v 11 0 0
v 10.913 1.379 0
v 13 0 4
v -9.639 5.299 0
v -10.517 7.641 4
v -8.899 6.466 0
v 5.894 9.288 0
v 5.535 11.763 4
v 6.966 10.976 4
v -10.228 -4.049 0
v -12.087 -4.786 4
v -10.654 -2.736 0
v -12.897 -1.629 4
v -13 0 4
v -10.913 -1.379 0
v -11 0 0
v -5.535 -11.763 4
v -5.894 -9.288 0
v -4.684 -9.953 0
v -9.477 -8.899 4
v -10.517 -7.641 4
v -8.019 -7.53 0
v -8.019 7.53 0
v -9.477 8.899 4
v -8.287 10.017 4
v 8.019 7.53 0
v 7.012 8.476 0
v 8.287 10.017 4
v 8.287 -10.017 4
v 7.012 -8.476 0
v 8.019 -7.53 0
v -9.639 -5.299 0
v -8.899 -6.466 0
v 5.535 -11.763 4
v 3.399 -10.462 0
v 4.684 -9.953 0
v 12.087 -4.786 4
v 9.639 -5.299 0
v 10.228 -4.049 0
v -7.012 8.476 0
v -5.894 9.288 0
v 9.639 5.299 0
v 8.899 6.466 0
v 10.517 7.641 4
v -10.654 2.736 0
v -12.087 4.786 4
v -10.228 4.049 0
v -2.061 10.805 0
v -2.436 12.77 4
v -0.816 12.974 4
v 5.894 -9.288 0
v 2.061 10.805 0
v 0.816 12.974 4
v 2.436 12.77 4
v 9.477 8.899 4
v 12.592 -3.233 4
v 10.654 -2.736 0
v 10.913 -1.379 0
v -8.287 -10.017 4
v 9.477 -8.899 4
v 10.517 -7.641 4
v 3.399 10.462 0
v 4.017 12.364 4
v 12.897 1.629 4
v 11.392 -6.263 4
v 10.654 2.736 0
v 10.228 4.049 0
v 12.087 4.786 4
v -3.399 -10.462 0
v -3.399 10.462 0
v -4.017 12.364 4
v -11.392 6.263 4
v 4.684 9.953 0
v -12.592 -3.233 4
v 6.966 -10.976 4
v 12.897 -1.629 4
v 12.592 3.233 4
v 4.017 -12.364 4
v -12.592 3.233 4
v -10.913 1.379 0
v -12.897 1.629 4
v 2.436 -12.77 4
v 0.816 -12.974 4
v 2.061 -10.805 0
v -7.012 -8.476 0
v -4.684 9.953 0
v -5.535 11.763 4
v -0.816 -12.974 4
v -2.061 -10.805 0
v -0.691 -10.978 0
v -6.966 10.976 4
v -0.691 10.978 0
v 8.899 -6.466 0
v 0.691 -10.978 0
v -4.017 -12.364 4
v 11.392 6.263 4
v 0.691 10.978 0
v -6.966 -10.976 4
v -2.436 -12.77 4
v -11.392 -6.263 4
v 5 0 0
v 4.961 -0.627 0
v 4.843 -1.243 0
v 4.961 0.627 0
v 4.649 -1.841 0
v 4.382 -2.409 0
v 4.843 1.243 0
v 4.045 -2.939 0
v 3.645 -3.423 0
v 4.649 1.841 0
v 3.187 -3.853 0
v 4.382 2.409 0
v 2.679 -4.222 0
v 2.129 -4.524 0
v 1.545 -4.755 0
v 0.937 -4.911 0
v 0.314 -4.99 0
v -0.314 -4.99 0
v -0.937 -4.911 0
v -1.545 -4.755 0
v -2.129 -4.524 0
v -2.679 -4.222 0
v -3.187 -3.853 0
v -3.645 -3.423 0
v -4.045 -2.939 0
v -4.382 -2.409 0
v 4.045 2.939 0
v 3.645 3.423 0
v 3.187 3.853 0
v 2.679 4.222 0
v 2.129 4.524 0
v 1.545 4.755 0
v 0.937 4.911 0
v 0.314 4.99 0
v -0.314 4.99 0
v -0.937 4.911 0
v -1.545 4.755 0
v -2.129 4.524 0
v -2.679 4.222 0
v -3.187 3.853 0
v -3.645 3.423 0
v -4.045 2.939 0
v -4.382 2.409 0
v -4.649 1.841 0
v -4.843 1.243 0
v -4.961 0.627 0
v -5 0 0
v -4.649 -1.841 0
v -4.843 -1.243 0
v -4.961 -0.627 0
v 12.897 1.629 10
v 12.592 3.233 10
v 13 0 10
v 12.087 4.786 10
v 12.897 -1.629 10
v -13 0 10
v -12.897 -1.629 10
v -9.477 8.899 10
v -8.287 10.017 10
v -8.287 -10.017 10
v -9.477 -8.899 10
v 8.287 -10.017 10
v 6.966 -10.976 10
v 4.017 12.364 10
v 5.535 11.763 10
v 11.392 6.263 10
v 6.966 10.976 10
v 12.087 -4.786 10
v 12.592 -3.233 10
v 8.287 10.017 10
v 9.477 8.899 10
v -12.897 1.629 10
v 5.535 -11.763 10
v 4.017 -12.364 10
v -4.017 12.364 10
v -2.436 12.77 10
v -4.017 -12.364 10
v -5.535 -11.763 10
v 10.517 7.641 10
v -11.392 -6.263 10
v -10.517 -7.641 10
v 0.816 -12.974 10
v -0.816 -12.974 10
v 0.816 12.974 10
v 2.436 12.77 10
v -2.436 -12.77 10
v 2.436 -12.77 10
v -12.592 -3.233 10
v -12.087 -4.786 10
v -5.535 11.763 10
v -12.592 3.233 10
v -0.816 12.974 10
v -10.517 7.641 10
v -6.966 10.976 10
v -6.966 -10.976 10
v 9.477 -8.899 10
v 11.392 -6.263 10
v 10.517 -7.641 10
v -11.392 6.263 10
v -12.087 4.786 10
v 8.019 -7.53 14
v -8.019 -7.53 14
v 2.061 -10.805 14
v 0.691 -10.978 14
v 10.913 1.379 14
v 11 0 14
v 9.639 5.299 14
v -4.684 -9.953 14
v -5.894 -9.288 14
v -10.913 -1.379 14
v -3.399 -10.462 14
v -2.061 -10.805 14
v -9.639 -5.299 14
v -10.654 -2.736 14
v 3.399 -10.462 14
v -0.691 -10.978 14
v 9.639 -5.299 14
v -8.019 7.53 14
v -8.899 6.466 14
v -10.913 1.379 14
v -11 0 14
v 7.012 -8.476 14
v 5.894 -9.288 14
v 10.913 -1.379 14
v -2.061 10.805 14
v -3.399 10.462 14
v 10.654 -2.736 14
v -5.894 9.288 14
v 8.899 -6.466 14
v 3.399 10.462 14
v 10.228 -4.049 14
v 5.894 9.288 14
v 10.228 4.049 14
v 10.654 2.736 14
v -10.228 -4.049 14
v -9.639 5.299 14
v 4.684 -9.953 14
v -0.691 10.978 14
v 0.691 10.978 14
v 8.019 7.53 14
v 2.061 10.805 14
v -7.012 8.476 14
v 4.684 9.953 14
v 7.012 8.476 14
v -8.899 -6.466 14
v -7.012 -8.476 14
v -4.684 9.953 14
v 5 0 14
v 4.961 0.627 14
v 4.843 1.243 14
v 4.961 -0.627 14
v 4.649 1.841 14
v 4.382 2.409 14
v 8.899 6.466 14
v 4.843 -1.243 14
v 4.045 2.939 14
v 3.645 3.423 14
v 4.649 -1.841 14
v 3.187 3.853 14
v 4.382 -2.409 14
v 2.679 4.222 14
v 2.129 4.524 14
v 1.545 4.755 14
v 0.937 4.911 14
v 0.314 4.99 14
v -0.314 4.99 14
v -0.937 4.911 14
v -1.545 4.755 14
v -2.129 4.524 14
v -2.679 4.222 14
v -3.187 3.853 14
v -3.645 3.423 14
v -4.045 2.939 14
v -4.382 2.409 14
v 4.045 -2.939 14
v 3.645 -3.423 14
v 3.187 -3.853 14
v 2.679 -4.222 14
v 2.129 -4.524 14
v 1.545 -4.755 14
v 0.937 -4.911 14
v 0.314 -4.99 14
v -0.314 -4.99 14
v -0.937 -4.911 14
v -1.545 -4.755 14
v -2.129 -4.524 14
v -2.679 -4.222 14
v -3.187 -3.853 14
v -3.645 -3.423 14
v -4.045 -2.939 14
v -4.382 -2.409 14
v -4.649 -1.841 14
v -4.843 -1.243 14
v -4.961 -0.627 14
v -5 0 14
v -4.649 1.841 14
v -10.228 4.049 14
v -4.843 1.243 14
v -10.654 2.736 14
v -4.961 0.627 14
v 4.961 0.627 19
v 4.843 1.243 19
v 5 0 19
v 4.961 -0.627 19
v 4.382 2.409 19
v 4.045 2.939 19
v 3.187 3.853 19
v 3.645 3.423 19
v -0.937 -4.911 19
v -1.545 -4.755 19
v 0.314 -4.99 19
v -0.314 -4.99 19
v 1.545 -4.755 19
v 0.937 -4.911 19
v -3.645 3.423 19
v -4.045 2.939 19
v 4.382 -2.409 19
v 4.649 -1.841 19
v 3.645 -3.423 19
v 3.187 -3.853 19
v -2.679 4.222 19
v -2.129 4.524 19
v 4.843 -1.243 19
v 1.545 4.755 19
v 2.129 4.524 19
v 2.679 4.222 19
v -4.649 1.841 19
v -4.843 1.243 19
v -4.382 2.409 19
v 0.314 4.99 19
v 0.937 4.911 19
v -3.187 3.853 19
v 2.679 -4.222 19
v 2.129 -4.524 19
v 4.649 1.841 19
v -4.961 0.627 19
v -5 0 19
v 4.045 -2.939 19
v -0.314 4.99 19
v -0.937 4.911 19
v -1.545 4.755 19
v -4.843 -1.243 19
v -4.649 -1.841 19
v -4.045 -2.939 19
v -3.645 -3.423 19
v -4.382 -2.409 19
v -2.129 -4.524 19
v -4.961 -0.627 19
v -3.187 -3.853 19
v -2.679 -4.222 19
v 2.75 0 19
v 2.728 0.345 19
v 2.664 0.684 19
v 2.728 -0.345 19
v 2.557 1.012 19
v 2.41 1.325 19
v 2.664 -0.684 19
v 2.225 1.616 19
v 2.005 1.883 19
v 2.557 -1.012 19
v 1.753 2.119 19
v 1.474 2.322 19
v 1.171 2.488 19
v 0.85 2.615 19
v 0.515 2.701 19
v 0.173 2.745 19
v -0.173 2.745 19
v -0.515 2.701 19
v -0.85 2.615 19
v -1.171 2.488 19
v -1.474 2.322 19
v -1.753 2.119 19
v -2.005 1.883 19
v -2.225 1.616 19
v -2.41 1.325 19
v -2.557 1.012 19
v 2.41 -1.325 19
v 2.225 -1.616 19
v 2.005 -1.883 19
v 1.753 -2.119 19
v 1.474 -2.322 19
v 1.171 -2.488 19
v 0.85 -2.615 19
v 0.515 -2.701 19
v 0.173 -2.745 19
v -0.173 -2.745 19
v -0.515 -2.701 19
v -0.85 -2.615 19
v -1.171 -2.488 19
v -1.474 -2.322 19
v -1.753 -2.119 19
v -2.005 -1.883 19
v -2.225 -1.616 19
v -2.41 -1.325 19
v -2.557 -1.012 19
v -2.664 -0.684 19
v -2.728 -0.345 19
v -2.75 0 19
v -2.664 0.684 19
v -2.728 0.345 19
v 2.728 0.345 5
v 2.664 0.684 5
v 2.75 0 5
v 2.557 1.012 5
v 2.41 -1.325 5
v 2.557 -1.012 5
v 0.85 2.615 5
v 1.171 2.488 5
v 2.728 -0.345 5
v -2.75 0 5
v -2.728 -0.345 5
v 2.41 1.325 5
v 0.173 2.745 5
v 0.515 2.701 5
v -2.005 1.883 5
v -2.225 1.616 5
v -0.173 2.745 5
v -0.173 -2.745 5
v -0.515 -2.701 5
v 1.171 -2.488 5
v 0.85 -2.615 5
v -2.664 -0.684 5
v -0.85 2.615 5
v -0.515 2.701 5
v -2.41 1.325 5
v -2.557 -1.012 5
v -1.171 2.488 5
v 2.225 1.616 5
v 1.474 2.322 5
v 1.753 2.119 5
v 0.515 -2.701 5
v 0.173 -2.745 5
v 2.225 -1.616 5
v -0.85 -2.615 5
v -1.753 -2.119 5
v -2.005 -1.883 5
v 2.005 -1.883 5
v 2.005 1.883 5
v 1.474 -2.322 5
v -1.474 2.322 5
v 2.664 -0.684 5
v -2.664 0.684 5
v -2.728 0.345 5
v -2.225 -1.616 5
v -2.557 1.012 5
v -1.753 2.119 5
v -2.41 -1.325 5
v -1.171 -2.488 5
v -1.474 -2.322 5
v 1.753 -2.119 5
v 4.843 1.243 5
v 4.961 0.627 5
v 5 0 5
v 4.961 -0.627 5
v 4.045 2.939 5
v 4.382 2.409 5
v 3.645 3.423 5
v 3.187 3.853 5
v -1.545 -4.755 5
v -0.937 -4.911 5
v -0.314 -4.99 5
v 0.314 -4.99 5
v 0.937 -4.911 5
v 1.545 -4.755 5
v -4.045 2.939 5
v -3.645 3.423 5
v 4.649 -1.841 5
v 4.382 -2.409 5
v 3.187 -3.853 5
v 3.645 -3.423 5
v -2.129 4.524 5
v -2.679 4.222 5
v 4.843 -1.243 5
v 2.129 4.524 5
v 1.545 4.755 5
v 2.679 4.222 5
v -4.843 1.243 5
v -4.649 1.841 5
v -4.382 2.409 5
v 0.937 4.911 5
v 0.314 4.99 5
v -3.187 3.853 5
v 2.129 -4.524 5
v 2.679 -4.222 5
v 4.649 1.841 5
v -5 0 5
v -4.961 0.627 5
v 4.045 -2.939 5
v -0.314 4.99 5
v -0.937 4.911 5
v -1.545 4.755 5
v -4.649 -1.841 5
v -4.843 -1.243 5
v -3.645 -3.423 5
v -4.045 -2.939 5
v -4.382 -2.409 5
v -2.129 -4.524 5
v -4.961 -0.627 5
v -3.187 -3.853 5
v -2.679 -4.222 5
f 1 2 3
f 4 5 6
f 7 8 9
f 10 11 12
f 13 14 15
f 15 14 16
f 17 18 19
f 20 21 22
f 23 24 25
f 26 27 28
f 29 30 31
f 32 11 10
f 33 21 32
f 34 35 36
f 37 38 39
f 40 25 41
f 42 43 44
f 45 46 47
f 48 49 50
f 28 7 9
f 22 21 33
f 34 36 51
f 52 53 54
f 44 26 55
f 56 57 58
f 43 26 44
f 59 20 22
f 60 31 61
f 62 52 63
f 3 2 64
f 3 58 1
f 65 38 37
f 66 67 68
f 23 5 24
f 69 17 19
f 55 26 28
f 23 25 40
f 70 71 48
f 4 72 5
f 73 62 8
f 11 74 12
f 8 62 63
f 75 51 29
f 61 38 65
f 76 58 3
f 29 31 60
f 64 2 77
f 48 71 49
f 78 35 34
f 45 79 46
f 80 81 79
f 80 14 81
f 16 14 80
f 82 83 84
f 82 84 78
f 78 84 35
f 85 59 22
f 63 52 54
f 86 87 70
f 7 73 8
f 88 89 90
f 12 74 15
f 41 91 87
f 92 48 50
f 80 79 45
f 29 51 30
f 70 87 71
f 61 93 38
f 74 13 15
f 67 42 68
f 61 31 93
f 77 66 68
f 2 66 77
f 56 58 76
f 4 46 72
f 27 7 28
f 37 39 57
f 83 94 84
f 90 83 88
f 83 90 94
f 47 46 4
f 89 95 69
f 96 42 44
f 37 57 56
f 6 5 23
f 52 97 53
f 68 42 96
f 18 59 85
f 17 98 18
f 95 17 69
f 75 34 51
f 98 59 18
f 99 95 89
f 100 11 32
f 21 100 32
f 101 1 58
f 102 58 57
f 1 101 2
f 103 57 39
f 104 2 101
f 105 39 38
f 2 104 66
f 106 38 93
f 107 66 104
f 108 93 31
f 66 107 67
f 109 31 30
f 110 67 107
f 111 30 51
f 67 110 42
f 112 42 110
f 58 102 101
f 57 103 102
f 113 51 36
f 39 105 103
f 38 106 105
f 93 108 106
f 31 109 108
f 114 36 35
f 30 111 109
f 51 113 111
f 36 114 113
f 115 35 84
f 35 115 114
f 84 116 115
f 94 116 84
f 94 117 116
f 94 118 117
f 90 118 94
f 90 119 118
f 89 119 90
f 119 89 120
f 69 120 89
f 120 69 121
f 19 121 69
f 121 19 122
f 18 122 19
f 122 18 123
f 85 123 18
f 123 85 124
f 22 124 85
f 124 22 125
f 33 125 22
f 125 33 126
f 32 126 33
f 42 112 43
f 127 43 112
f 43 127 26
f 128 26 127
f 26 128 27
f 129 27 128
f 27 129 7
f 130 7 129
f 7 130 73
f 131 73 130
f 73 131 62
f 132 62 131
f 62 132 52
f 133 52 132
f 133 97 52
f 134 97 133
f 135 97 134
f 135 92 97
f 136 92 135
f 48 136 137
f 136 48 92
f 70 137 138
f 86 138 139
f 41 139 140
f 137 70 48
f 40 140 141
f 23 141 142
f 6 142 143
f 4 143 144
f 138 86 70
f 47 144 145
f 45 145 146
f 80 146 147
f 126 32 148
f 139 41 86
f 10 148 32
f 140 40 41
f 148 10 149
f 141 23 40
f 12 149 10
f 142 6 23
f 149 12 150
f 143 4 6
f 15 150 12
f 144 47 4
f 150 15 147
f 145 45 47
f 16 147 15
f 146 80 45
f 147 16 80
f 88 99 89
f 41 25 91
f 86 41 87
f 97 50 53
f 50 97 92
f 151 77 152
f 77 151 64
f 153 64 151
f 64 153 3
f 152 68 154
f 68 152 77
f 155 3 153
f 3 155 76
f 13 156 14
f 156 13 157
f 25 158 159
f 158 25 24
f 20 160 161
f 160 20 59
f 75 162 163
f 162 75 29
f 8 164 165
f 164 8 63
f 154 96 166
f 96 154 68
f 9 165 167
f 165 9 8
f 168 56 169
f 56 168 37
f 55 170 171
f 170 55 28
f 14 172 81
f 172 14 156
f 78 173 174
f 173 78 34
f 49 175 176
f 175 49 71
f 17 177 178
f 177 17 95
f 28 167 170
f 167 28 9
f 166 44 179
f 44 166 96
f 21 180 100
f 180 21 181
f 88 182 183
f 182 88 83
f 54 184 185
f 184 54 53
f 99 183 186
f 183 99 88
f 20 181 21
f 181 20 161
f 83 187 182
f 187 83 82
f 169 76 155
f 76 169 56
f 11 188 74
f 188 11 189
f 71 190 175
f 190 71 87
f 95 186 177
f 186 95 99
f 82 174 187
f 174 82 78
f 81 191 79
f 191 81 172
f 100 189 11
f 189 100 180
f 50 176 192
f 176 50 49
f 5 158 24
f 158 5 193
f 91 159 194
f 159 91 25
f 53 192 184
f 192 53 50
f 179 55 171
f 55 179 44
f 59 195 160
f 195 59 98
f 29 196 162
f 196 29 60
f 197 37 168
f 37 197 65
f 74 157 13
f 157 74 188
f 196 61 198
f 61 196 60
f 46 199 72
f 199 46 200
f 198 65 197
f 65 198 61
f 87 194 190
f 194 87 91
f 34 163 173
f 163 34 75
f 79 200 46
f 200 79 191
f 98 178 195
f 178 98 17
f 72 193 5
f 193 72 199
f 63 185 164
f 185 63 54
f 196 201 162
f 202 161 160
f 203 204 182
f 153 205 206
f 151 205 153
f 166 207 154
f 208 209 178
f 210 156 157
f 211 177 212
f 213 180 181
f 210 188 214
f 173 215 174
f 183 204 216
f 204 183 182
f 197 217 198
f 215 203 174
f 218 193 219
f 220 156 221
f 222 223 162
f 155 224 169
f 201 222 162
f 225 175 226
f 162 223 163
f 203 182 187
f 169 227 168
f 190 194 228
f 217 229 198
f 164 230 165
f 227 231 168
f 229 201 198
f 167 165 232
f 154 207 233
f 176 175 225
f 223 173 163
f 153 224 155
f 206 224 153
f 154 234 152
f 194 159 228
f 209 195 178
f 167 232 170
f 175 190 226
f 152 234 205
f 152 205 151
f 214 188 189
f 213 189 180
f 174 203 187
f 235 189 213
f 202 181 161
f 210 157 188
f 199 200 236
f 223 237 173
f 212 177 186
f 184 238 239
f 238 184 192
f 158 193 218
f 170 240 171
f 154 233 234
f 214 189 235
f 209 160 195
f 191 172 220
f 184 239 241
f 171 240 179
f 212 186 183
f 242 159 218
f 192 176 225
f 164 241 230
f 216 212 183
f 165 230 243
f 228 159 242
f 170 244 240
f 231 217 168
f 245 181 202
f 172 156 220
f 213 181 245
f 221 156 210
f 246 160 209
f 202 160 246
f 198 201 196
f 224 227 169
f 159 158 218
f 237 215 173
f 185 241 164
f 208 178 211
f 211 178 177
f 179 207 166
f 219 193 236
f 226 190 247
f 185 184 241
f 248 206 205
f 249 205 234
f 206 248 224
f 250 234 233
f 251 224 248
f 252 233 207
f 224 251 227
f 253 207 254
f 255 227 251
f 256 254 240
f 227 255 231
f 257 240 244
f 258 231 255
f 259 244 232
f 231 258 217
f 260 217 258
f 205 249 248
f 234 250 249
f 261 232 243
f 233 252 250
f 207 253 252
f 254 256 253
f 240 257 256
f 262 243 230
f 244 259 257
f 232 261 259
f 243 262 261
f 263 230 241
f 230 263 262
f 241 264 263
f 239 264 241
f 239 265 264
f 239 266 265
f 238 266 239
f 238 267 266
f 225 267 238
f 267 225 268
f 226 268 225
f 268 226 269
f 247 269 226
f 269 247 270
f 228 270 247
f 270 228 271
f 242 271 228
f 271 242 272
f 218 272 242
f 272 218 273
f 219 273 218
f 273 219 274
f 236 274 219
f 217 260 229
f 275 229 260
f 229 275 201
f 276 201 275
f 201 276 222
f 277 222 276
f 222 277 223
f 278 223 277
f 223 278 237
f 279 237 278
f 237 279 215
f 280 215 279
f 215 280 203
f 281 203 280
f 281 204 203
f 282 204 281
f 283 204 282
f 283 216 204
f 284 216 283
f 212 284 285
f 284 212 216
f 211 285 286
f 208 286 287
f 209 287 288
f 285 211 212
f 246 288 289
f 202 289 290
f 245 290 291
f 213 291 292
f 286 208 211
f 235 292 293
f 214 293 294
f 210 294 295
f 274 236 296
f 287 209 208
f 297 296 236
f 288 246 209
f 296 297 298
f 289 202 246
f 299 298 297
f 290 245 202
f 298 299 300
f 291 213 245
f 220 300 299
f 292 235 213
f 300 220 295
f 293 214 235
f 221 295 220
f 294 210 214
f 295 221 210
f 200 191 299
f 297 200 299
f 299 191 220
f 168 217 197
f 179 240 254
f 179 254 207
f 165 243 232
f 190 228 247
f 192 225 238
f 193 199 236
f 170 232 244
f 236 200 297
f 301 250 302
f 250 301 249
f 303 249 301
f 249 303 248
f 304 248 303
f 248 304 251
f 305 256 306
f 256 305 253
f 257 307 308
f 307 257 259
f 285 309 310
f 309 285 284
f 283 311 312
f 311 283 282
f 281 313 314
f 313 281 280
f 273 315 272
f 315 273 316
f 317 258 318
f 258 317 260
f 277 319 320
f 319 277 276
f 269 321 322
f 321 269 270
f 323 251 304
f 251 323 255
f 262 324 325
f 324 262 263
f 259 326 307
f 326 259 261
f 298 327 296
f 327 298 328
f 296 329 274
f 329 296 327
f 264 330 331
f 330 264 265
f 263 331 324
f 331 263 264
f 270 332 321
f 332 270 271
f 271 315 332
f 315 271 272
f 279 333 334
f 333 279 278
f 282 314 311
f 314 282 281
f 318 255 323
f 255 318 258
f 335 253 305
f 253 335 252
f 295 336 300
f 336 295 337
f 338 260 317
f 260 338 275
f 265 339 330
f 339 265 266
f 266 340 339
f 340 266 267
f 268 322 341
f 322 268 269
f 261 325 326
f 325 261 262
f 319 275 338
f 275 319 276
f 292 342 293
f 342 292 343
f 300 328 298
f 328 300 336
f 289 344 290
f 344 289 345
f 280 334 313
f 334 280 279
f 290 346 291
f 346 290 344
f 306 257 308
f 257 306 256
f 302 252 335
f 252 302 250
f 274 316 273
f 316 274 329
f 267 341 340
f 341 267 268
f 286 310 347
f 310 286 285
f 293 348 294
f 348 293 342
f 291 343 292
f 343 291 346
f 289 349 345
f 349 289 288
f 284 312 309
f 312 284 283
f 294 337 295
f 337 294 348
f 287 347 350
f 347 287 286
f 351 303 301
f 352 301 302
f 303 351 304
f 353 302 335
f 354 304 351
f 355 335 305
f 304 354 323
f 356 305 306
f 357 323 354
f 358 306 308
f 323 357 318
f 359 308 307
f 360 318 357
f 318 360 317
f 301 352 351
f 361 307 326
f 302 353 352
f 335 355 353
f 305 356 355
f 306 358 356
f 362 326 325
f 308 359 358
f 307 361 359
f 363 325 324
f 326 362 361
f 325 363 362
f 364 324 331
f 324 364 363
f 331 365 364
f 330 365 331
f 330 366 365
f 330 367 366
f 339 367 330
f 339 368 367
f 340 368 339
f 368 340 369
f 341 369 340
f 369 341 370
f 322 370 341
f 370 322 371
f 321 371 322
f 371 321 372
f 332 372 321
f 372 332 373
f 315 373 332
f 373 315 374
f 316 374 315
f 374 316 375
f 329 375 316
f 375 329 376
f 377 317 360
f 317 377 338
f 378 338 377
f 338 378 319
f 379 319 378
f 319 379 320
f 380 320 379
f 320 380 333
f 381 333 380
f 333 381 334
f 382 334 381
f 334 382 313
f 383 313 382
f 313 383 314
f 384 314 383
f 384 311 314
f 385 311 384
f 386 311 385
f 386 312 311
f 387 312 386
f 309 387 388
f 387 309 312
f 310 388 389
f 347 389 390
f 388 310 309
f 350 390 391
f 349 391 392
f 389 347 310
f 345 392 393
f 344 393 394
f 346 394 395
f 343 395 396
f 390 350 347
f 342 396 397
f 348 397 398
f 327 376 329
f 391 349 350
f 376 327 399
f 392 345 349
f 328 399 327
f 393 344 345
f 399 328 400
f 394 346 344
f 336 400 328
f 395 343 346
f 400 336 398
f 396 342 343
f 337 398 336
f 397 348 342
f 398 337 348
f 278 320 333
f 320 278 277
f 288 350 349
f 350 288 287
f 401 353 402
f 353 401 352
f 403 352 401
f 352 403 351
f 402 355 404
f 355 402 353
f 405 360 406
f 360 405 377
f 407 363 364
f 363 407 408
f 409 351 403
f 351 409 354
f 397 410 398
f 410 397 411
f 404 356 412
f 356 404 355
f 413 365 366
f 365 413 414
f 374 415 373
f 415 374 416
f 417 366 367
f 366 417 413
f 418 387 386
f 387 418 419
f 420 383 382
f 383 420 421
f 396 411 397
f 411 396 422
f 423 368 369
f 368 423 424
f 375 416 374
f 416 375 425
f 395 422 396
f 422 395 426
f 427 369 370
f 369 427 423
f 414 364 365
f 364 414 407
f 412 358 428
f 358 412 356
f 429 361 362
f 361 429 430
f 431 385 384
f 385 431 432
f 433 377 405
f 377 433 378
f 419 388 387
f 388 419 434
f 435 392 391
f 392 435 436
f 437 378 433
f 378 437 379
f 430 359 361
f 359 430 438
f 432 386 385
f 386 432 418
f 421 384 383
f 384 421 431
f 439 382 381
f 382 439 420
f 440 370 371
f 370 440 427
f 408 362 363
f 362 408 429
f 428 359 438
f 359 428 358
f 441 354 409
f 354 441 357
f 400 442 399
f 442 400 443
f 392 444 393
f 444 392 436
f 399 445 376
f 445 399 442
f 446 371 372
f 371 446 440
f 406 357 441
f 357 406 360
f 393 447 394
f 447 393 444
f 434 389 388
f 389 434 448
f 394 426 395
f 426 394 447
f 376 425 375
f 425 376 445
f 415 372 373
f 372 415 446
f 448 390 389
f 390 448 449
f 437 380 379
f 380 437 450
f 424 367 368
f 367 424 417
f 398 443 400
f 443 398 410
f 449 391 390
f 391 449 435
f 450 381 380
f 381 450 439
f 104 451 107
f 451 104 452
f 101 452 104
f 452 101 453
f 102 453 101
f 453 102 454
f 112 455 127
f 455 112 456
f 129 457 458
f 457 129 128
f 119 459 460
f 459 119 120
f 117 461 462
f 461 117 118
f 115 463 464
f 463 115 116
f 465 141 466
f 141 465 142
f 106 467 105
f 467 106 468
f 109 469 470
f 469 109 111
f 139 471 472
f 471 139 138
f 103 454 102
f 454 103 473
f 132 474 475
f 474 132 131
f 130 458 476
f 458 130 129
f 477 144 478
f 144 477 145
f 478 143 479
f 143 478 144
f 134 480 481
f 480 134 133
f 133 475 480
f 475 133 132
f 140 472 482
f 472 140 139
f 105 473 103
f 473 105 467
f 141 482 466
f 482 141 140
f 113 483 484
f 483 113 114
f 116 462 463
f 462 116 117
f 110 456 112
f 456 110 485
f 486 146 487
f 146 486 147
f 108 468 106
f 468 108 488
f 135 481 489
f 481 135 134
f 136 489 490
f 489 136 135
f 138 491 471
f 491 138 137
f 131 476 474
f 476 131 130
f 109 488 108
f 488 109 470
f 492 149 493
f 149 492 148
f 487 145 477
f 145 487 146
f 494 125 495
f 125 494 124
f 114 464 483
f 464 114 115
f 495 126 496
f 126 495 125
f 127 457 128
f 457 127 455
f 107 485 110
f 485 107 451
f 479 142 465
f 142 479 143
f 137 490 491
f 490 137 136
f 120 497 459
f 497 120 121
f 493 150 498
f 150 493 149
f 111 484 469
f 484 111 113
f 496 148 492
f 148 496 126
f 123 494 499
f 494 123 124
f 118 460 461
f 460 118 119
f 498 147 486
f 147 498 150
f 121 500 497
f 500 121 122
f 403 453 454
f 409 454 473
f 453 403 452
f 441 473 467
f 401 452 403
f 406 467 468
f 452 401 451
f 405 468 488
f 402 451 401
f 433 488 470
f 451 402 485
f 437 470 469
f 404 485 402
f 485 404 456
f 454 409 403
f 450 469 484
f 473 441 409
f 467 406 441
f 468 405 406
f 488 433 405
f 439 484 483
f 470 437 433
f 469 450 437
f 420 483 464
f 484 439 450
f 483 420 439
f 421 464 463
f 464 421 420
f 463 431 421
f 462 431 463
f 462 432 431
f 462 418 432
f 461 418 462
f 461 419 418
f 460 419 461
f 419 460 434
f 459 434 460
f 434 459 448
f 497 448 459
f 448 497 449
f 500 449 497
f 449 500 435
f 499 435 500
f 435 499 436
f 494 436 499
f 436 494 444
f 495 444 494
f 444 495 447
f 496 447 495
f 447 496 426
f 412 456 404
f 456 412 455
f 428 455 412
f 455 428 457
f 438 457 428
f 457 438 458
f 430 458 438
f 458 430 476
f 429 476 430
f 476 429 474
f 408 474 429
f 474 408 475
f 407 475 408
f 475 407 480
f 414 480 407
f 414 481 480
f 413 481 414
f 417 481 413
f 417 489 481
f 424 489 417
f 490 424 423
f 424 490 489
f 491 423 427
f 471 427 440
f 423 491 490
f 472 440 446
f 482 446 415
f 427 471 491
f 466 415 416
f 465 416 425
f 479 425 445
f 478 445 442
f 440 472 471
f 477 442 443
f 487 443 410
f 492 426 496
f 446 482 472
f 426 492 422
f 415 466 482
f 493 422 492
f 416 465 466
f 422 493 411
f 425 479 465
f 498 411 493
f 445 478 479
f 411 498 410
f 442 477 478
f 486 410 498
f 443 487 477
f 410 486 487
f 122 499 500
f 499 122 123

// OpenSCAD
GEAR_INNER_DIA = 5.5;//6;
GEAR_INNER_WIDTH = 4;

GEAR_OUTER_DIA = 26;
GEAR_WIDTH = 14;

GEAR_CROWN_WIDTH = 6;
GEAR_CROWN_DIA = 22;

SHAFT_LENGTH = GEAR_WIDTH + 5;
SHAFT_DIA = 10;
SHAFT_BOLT_DIA = SHAFT_DIA;
SHAFT_BOLT_LENGTH = 5;// 3;

ROUND_SHAFT = true;

$fn = 50;

module shaft() {
  intersection() {
    cylinder(d = GEAR_INNER_DIA, h = SHAFT_LENGTH);
    if(!ROUND_SHAFT) {
      cube(size = [GEAR_INNER_WIDTH, GEAR_INNER_DIA, 2 * SHAFT_LENGTH], center = true);
    }
  }
  
  cylinder(d = SHAFT_BOLT_DIA, h = SHAFT_BOLT_LENGTH);
}

module gear() {
  difference(){
    union() {
      ch = (GEAR_WIDTH - GEAR_CROWN_WIDTH)/2;
      cylinder(d1 = GEAR_CROWN_DIA, d2 = GEAR_OUTER_DIA, h = ch);
      
      translate([0, 0, ch])
      cylinder(d = GEAR_OUTER_DIA, h = GEAR_CROWN_WIDTH);
      
      translate([0, 0, ch + GEAR_CROWN_WIDTH])
      cylinder(d1 = GEAR_OUTER_DIA, d2 = GEAR_CROWN_DIA, h = ch);
      
      cylinder(d = SHAFT_DIA, h = SHAFT_LENGTH);
    }
    
    shaft();
  }
}

gear();
